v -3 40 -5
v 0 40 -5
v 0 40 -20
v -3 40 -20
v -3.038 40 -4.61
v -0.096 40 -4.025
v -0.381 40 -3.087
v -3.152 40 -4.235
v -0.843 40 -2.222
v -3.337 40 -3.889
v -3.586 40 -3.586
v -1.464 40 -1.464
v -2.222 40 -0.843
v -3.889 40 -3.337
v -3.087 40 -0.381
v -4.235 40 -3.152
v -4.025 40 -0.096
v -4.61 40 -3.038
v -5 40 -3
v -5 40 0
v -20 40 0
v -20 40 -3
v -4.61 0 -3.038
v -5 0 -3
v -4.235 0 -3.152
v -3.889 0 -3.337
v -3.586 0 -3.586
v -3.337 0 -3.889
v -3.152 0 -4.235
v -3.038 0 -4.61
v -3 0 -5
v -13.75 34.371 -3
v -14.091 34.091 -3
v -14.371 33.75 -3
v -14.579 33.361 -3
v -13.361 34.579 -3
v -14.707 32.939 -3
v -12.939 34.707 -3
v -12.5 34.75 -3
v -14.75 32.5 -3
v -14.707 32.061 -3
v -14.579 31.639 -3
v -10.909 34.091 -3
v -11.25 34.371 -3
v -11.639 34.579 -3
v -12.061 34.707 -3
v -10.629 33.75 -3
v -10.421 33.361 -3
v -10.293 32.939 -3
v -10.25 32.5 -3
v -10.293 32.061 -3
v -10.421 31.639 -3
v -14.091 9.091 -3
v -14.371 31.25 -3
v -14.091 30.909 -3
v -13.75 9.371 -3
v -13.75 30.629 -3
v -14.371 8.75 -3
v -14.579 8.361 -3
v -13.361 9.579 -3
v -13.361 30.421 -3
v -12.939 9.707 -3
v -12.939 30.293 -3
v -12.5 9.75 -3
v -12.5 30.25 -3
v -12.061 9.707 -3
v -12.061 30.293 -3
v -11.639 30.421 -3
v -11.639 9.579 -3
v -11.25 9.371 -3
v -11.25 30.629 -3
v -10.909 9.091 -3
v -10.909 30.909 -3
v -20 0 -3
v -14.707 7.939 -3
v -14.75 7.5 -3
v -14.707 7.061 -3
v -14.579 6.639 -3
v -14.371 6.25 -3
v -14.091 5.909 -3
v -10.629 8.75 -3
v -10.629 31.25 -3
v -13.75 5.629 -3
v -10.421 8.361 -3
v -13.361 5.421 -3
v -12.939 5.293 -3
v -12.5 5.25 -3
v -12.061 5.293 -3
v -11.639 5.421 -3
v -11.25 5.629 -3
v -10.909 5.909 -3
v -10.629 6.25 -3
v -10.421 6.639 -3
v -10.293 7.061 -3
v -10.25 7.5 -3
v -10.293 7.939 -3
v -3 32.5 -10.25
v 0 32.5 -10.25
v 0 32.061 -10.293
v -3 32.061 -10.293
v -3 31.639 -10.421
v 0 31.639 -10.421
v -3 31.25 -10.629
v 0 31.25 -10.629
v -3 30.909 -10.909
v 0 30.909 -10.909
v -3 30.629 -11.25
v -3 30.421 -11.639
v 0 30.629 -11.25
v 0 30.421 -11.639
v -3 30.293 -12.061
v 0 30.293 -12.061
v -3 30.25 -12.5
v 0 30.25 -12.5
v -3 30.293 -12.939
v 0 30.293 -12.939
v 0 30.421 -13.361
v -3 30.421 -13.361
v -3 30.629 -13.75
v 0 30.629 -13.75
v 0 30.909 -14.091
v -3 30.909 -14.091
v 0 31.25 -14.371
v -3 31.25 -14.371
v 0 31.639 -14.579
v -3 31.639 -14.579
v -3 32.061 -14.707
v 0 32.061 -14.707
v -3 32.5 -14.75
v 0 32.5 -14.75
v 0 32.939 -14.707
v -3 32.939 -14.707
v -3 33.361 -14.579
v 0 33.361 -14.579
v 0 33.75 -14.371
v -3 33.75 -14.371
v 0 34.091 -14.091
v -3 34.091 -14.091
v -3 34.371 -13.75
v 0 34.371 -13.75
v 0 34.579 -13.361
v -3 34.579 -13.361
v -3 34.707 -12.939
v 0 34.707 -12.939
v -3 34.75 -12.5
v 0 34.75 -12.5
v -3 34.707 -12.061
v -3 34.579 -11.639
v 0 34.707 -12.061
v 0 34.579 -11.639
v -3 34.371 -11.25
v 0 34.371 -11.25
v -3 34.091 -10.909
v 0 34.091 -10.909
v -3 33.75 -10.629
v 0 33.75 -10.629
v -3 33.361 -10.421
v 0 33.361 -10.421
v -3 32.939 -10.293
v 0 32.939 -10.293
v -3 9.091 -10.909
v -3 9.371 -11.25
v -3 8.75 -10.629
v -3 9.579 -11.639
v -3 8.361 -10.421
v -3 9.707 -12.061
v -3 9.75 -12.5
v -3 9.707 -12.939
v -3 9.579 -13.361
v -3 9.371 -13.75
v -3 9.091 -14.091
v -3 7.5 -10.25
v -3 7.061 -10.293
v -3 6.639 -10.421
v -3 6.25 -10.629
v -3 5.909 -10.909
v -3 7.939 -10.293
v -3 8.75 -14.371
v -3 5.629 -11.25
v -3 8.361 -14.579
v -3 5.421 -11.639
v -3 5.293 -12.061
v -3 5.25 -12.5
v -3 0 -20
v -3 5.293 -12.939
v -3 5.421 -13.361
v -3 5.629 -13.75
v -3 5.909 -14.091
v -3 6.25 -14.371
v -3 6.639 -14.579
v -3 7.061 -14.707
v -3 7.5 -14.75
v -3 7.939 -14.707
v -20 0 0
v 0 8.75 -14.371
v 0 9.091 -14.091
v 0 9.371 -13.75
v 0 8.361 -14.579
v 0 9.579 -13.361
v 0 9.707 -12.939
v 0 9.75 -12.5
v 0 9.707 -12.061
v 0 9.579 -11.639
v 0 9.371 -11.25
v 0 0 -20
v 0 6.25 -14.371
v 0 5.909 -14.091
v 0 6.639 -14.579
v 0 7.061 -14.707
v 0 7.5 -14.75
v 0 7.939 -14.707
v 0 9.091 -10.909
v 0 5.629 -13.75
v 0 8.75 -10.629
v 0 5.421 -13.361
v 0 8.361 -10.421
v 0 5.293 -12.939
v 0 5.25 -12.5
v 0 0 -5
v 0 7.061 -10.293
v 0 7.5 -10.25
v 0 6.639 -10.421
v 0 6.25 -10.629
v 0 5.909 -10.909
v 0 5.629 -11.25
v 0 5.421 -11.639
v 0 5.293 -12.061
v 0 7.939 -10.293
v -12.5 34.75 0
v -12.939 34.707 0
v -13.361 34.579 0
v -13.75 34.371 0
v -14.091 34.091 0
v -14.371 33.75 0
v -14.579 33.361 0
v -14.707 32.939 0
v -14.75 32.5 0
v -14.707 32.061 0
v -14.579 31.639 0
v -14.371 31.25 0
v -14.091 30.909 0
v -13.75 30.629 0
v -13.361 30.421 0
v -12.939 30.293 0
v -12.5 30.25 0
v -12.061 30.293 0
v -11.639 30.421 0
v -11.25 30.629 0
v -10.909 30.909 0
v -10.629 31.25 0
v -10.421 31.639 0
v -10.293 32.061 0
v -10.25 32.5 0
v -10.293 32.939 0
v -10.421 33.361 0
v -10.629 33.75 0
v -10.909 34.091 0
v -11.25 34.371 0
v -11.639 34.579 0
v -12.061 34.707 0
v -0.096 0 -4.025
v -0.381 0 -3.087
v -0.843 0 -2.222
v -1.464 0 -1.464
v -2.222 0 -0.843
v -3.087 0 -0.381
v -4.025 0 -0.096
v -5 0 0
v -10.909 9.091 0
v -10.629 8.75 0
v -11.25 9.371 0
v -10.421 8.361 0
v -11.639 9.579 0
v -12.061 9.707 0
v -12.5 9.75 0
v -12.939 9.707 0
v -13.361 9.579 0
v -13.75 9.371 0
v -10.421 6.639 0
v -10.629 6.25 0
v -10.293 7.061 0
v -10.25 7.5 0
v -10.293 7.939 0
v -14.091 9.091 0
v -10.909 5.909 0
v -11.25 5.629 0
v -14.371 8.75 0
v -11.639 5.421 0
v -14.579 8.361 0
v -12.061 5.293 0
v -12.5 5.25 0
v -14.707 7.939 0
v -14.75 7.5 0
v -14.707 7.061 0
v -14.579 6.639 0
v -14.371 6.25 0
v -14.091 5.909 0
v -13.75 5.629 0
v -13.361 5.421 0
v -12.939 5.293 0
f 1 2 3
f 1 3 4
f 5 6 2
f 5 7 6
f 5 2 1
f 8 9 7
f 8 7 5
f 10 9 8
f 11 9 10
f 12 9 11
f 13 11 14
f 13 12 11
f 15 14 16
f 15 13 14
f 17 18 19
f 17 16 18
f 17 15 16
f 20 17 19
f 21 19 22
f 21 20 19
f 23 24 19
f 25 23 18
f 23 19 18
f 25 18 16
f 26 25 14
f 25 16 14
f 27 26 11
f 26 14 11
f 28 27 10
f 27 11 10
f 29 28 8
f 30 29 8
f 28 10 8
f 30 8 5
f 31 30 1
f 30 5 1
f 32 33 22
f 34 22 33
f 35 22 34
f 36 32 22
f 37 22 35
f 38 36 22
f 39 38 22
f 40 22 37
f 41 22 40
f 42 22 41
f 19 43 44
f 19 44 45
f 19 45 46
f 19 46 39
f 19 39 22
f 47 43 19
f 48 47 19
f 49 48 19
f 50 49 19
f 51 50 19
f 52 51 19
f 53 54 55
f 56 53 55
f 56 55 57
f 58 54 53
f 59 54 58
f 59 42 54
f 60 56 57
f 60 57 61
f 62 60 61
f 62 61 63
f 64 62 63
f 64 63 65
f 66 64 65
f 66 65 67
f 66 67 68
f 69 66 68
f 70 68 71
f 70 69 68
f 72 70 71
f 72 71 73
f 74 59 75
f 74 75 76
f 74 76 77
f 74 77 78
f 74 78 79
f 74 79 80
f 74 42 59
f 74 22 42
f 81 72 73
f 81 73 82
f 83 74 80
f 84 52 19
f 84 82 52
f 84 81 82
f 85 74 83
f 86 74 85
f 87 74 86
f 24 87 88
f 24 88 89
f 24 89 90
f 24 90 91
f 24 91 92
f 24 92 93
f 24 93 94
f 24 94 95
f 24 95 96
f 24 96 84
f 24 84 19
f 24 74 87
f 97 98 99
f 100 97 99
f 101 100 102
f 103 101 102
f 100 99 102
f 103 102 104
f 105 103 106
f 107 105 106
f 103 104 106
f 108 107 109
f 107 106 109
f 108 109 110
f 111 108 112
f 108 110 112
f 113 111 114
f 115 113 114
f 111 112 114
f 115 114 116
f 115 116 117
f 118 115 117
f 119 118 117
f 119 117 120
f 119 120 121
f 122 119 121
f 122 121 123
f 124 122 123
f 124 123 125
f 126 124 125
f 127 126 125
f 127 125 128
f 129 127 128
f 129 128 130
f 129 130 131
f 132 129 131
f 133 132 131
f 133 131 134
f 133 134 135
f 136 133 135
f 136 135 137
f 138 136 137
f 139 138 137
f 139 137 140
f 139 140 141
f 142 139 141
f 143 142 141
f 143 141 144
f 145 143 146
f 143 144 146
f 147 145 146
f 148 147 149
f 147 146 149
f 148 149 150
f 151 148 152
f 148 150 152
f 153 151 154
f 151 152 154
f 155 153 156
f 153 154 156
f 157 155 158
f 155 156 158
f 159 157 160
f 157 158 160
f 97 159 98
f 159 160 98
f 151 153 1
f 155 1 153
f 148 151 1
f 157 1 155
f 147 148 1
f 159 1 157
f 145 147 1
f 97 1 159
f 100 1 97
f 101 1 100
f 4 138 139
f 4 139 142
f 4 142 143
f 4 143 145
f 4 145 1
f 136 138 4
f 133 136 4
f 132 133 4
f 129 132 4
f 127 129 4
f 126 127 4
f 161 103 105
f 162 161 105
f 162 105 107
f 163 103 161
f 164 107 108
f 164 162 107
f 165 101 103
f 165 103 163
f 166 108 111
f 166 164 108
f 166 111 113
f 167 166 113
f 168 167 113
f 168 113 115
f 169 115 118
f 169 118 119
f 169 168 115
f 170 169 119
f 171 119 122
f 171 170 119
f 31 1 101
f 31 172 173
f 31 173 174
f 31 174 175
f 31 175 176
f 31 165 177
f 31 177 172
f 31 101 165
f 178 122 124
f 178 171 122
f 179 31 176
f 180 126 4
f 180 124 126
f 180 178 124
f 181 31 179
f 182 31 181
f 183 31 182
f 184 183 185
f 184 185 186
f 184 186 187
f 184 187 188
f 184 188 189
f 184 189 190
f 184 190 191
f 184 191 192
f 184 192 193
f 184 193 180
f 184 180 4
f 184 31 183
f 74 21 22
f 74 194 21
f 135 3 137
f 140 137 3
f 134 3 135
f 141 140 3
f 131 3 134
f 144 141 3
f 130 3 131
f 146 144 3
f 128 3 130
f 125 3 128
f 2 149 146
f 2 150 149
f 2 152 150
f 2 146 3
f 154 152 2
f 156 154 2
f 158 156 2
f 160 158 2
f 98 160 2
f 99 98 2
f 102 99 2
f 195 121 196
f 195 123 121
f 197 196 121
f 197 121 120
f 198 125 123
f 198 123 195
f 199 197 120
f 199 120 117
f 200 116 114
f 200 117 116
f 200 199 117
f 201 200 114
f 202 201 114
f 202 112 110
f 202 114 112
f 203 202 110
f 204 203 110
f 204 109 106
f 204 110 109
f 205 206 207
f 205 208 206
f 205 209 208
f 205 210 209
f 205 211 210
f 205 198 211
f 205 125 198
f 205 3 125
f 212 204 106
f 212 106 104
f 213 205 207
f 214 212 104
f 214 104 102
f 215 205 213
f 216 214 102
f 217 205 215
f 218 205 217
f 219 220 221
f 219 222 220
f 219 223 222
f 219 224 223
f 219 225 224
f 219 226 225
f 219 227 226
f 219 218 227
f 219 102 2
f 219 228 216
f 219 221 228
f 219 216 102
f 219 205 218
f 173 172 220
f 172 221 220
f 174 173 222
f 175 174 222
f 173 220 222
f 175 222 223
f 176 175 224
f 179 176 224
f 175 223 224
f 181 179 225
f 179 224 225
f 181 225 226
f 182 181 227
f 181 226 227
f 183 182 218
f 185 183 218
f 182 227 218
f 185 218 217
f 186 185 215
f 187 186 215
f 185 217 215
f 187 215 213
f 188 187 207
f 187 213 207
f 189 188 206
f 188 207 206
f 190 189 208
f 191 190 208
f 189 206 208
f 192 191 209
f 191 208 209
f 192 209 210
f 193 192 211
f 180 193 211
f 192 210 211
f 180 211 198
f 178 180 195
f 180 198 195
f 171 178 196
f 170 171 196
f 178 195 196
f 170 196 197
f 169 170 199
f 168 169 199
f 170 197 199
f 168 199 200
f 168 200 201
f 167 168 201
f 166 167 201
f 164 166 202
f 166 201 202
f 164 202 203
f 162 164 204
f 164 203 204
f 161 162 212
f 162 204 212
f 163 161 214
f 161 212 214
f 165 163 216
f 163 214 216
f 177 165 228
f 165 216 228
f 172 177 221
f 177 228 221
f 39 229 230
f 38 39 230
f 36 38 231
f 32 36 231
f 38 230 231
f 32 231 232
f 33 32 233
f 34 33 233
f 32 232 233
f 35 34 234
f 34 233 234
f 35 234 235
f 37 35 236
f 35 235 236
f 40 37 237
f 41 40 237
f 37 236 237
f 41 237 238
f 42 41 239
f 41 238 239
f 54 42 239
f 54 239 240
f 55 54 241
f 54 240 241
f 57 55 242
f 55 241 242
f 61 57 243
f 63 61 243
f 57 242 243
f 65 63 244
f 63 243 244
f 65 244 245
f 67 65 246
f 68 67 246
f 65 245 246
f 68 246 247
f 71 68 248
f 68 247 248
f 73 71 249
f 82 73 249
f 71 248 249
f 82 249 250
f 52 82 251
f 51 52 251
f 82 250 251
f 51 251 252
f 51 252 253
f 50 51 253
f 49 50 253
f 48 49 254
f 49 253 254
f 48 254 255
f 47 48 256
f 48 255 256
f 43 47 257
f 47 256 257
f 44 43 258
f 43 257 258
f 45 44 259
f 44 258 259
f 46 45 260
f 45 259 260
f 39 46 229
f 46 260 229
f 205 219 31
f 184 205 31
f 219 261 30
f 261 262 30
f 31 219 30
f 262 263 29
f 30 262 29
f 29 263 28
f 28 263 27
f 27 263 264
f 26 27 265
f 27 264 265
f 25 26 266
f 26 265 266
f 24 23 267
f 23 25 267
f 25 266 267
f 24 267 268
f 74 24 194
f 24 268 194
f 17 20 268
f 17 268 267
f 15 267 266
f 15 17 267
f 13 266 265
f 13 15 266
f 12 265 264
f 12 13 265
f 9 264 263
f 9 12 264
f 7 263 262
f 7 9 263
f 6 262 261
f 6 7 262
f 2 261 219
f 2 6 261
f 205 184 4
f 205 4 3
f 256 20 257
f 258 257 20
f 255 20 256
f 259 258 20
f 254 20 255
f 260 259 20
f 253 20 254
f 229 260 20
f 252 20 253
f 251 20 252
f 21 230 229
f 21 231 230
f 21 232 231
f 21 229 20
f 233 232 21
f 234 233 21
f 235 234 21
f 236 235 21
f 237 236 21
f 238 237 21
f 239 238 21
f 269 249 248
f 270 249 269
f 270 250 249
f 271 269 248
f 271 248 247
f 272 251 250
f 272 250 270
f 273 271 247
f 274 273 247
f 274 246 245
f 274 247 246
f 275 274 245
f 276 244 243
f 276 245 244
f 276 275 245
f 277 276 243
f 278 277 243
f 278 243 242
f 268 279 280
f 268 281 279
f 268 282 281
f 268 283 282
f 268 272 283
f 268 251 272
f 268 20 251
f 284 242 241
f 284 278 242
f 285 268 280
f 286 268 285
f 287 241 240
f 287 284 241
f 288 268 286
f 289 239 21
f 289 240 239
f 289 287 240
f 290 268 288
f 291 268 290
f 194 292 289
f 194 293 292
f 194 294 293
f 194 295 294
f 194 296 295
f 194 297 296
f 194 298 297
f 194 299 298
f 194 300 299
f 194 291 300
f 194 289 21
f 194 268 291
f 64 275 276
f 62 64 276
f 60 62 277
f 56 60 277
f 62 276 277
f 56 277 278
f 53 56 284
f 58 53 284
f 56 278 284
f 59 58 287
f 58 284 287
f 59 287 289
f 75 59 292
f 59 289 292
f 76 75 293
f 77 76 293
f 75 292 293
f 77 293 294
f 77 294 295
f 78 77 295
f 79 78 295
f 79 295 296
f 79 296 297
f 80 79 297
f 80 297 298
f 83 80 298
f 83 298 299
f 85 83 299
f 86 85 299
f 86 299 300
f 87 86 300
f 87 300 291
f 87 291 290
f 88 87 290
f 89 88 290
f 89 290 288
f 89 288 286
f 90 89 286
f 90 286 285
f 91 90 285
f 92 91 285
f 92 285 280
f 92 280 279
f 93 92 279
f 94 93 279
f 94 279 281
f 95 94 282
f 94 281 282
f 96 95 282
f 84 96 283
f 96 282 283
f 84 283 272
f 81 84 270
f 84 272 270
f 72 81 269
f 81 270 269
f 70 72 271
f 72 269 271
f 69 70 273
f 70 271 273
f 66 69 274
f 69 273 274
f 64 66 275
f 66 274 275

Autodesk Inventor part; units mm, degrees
ref_plane "YZ Plane" through (0, 0, 0) normal (1, 0, 0) x (0, 1, 0)
ref_plane "XZ Plane" through (0, 0, 0) normal (0, 1, 0) x (-1, 0, 0)
ref_plane "XY Plane" through (0, 0, 0) normal (0, 0, 1) x (1, 0, 0)
sketch "Sketch1" plane through (0, 0, 0) normal (0, 1, 0) x (-1, 0, 0)
  line L0 (0, 0) -> (20, 0)
  line L1 (20, 0) -> (20, -3)
  line L2 (20, -3) -> (0, -3)
  line L3 (0, -3) -> (0, 0)
  line L4 (0, 0) -> (3, 0)
  line L5 (3, 0) -> (3, -20)
  line L6 (3, -20) -> (0, -20)
  line L7 (0, -20) -> (0, 0)
  dimension "d0" = 3
  dimension "d1" = 3
  dimension "d2" = 20
  dimension "d3" = 20
extrude "Extrusion1" add sketch "Sketch1" along normal blind 40
fillet "Fillet1" radius 2 1 edges at (-3, 20, -3)
fillet "Fillet2" radius 5 1 edges at (0, 20, 0)
sketch "Sketch2" plane through (-3, 0, -20) normal (-1, 0, 0) x (0, 0, 1)
  line L0 (0, 40) -> (15, 40) projected
  line L1 (0, 0) -> (15, 0) projected
  line L2 (0, 0) -> (0, 40) projected
  point P0 (20, 0)
  point P1 (7.5, 32.5)
  point P2 (7.5, 7.5)
  dimension "d8" = 7.5
  dimension "d9" = 7.5
  dimension "d10" = 25
  dimension "d11" = 7.5
hole "Hole1" at (-3, 32.5, -12.5) at (-3, 7.5, -12.5) direction (1, 0, 0) diameter 4.5 end through all clearance for "Socket Head Cap Screw" size "M4" standard "Ansi Metric M Profile"
sketch "Sketch3" plane through (-20, 0, -3) normal (0, 0, -1) x (-1, 0, 0)
  line L0 (-15, 40) -> (0, 40) projected
  line L1 (-15, 0) -> (0, 0) projected
  line L2 (0, 0) -> (0, 40) projected
  point P0 (-20, 0)
  point P1 (-7.5, 32.5)
  point P2 (-7.5, 7.5)
  dimension "d19" = 7.5
  dimension "d20" = 7.5
  dimension "d21" = 7.5
hole "Hole2" at (-12.5, 32.5, -3) at (-12.5, 7.5, -3) direction (0, 0, 1) diameter 4.5 end through all clearance for "Socket Head Cap Screw" size "M4" standard "Ansi Metric M Profile"
equation "\"d1\" = d0"
equation "\"d3\" = d2"
equation "\"d9\" = d8"
equation "\"d20\" = d19"
equation "\"d21\" = d19"
properties part number "Timing_Angle Bracket" material "Aluminum 6061"
